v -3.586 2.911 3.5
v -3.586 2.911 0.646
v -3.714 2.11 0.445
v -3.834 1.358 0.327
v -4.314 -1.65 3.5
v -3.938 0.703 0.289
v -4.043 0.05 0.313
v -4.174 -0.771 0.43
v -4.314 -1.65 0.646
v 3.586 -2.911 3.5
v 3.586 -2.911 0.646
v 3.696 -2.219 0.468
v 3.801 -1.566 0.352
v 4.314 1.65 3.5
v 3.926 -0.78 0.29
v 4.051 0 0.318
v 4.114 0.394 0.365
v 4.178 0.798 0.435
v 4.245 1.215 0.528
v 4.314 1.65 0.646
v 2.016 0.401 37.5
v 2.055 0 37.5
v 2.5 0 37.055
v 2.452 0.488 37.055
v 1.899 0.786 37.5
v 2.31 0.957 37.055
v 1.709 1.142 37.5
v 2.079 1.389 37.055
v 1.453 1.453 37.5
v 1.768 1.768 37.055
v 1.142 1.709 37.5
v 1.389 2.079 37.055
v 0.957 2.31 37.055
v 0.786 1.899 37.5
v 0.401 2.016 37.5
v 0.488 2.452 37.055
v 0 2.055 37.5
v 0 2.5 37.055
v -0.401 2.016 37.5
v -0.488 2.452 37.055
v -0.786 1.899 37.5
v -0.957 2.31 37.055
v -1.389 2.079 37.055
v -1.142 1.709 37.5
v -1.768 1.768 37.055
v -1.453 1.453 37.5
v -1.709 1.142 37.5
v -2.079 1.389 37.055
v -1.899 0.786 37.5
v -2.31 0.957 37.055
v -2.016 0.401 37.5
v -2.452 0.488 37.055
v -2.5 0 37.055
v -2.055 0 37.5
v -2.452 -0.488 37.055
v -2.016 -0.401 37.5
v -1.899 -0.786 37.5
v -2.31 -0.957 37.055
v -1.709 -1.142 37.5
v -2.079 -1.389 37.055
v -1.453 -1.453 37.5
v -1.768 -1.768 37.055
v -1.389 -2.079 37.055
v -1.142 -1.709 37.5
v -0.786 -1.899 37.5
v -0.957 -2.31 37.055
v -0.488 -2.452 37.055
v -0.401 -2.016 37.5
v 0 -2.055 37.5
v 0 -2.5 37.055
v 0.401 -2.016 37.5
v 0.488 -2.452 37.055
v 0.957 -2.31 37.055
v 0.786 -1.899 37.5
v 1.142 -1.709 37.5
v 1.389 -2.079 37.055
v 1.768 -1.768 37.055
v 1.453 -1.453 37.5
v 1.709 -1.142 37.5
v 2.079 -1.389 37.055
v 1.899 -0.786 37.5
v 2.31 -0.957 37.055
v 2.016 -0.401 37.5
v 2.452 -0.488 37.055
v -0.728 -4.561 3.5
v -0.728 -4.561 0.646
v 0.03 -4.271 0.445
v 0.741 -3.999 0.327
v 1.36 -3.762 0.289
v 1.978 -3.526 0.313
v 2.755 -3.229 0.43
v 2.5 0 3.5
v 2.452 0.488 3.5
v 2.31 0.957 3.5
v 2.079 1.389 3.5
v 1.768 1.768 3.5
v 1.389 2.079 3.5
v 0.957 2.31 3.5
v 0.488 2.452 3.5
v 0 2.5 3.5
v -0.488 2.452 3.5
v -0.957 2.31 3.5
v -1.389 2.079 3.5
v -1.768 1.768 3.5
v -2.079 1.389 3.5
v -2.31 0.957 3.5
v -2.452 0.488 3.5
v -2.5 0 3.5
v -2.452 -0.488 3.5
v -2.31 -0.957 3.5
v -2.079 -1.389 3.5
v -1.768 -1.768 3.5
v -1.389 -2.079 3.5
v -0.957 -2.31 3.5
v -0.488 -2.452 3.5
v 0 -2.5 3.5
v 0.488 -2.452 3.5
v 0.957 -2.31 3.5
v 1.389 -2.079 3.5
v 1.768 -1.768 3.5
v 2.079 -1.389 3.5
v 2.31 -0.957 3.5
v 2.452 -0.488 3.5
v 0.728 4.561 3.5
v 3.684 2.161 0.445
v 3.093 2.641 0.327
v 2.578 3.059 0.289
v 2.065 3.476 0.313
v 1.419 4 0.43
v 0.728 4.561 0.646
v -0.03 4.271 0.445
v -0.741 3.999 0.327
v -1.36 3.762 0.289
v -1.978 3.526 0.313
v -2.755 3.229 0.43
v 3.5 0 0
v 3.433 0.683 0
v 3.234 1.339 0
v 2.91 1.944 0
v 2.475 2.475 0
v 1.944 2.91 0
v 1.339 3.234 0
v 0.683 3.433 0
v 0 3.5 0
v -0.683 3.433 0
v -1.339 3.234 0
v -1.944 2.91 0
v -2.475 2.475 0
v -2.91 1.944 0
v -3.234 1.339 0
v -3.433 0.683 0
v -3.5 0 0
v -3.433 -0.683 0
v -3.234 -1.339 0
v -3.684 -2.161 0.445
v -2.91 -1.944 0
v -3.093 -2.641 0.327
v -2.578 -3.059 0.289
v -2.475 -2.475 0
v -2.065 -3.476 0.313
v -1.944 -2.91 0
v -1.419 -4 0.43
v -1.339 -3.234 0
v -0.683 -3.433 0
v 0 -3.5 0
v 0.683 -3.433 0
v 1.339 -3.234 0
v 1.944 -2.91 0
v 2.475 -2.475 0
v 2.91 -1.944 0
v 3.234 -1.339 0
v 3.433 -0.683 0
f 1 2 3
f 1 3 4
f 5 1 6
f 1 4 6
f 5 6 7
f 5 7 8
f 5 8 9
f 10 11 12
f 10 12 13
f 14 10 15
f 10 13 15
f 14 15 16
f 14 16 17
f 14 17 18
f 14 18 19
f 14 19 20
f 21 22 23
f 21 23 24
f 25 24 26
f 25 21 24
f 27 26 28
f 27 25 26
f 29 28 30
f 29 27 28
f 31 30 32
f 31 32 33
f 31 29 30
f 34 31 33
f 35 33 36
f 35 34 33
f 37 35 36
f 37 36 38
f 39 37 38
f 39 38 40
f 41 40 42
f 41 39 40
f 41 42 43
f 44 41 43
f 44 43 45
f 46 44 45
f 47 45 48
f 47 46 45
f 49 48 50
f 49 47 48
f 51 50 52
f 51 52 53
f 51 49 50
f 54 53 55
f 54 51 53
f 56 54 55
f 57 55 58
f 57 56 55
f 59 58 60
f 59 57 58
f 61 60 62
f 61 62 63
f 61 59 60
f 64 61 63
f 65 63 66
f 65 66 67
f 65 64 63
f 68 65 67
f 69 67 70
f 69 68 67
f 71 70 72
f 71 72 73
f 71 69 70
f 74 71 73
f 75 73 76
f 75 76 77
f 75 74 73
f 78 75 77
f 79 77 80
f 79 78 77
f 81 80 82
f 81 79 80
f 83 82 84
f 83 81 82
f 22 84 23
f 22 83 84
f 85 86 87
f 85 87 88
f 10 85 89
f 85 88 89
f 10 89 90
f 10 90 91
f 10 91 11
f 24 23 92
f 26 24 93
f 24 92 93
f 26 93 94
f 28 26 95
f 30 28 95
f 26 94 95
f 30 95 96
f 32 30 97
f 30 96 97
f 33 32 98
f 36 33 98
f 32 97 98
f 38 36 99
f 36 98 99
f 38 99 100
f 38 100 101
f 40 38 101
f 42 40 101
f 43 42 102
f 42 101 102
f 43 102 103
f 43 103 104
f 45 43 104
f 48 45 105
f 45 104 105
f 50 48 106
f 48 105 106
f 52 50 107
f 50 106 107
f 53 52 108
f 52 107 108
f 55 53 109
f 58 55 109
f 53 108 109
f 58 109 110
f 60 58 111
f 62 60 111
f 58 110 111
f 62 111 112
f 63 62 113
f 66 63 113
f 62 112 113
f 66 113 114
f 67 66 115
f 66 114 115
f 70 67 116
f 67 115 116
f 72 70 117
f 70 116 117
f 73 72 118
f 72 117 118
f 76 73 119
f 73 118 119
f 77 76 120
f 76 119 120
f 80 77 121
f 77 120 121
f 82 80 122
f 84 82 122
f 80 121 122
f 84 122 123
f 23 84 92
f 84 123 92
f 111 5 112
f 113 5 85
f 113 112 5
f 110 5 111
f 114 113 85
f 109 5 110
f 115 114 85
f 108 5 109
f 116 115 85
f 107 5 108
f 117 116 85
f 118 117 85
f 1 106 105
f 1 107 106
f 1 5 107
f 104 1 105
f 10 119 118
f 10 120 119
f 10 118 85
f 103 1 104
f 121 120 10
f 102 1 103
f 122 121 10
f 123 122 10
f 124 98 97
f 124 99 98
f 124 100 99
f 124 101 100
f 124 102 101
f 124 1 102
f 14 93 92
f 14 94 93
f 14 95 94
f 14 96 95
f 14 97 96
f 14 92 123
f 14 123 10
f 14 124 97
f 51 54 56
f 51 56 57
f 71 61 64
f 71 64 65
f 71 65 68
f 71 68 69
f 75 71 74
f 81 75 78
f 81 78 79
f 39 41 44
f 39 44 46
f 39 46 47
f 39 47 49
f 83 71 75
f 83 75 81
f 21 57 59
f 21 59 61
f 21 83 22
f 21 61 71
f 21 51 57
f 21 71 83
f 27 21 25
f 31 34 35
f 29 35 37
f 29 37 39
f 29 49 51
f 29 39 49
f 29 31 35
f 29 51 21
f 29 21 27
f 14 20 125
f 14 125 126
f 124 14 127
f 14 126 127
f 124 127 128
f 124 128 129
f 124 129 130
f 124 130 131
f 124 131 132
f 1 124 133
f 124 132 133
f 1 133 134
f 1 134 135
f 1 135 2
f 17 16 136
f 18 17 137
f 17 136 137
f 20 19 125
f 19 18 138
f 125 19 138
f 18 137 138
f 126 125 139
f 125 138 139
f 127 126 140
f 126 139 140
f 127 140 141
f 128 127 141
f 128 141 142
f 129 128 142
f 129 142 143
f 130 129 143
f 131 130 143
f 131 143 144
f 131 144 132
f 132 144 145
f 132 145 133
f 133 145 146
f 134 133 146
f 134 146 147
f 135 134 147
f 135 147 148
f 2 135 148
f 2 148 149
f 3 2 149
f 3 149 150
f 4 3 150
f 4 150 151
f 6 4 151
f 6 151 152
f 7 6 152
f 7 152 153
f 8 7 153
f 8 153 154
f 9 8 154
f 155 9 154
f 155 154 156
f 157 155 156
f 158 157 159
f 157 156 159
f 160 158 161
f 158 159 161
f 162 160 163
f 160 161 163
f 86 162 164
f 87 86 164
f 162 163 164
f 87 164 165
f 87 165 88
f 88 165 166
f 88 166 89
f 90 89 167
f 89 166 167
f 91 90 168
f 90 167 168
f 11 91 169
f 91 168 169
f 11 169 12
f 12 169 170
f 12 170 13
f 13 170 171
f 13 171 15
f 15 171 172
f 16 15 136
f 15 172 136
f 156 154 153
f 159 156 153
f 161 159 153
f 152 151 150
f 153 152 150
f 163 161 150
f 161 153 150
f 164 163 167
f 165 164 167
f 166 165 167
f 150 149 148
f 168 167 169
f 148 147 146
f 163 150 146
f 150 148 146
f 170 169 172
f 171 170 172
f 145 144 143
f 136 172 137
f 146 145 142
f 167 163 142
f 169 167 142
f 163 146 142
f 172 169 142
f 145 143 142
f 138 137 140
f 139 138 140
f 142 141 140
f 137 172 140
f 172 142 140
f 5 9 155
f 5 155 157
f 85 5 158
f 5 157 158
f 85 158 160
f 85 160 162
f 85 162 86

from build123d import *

# Parameters (mm, degrees)
EXTRUDE_1_DEPTH = 3.5
SKETCH_2_R      = 2.5
EXTRUDE_2_DEPTH = 34
CHAMFER_1_SIZE  = 0.445


with BuildPart() as part:
    # Эскиз1 → Бобышка-Вытянуть1 (new body)
    with BuildSketch(Plane.XY):
        Polygon((0.728296009, 4.561021624), (-3.585812589, 2.911233657), (-4.314108598, -1.649787967), (-0.728296009, -4.561021624), (3.585812589, -2.911233657), (4.314108598, 1.649787967), align=None)
    extrude(amount=EXTRUDE_1_DEPTH)

    # Эскиз2 → Бобышка-Вытянуть2 (add)
    with BuildSketch(Plane.XY.offset(3.5)):
        Circle(SKETCH_2_R)
    extrude(amount=EXTRUDE_2_DEPTH)

    # Фаска1
    chamfer_1_edges = [part.edges().sort_by_distance(p)[0] for p in [
        (-2.5, 0, 37.5),
    ]]
    chamfer(chamfer_1_edges, length=CHAMFER_1_SIZE)

    # Эскиз4 → Вырез-Повернуть1 (revolve, cut)
    with BuildSketch(Plane(origin=(0, 0, 0), x_dir=(1, 0, 0), z_dir=(0, 1, 0))):
        Polygon((3.5, 0), (7.5, 0), (7.5, -2.309401077), align=None)
    revolve(axis=Axis((0, 0, 0), (0, 0, 1)), mode=Mode.SUBTRACT)


solid = part.part
